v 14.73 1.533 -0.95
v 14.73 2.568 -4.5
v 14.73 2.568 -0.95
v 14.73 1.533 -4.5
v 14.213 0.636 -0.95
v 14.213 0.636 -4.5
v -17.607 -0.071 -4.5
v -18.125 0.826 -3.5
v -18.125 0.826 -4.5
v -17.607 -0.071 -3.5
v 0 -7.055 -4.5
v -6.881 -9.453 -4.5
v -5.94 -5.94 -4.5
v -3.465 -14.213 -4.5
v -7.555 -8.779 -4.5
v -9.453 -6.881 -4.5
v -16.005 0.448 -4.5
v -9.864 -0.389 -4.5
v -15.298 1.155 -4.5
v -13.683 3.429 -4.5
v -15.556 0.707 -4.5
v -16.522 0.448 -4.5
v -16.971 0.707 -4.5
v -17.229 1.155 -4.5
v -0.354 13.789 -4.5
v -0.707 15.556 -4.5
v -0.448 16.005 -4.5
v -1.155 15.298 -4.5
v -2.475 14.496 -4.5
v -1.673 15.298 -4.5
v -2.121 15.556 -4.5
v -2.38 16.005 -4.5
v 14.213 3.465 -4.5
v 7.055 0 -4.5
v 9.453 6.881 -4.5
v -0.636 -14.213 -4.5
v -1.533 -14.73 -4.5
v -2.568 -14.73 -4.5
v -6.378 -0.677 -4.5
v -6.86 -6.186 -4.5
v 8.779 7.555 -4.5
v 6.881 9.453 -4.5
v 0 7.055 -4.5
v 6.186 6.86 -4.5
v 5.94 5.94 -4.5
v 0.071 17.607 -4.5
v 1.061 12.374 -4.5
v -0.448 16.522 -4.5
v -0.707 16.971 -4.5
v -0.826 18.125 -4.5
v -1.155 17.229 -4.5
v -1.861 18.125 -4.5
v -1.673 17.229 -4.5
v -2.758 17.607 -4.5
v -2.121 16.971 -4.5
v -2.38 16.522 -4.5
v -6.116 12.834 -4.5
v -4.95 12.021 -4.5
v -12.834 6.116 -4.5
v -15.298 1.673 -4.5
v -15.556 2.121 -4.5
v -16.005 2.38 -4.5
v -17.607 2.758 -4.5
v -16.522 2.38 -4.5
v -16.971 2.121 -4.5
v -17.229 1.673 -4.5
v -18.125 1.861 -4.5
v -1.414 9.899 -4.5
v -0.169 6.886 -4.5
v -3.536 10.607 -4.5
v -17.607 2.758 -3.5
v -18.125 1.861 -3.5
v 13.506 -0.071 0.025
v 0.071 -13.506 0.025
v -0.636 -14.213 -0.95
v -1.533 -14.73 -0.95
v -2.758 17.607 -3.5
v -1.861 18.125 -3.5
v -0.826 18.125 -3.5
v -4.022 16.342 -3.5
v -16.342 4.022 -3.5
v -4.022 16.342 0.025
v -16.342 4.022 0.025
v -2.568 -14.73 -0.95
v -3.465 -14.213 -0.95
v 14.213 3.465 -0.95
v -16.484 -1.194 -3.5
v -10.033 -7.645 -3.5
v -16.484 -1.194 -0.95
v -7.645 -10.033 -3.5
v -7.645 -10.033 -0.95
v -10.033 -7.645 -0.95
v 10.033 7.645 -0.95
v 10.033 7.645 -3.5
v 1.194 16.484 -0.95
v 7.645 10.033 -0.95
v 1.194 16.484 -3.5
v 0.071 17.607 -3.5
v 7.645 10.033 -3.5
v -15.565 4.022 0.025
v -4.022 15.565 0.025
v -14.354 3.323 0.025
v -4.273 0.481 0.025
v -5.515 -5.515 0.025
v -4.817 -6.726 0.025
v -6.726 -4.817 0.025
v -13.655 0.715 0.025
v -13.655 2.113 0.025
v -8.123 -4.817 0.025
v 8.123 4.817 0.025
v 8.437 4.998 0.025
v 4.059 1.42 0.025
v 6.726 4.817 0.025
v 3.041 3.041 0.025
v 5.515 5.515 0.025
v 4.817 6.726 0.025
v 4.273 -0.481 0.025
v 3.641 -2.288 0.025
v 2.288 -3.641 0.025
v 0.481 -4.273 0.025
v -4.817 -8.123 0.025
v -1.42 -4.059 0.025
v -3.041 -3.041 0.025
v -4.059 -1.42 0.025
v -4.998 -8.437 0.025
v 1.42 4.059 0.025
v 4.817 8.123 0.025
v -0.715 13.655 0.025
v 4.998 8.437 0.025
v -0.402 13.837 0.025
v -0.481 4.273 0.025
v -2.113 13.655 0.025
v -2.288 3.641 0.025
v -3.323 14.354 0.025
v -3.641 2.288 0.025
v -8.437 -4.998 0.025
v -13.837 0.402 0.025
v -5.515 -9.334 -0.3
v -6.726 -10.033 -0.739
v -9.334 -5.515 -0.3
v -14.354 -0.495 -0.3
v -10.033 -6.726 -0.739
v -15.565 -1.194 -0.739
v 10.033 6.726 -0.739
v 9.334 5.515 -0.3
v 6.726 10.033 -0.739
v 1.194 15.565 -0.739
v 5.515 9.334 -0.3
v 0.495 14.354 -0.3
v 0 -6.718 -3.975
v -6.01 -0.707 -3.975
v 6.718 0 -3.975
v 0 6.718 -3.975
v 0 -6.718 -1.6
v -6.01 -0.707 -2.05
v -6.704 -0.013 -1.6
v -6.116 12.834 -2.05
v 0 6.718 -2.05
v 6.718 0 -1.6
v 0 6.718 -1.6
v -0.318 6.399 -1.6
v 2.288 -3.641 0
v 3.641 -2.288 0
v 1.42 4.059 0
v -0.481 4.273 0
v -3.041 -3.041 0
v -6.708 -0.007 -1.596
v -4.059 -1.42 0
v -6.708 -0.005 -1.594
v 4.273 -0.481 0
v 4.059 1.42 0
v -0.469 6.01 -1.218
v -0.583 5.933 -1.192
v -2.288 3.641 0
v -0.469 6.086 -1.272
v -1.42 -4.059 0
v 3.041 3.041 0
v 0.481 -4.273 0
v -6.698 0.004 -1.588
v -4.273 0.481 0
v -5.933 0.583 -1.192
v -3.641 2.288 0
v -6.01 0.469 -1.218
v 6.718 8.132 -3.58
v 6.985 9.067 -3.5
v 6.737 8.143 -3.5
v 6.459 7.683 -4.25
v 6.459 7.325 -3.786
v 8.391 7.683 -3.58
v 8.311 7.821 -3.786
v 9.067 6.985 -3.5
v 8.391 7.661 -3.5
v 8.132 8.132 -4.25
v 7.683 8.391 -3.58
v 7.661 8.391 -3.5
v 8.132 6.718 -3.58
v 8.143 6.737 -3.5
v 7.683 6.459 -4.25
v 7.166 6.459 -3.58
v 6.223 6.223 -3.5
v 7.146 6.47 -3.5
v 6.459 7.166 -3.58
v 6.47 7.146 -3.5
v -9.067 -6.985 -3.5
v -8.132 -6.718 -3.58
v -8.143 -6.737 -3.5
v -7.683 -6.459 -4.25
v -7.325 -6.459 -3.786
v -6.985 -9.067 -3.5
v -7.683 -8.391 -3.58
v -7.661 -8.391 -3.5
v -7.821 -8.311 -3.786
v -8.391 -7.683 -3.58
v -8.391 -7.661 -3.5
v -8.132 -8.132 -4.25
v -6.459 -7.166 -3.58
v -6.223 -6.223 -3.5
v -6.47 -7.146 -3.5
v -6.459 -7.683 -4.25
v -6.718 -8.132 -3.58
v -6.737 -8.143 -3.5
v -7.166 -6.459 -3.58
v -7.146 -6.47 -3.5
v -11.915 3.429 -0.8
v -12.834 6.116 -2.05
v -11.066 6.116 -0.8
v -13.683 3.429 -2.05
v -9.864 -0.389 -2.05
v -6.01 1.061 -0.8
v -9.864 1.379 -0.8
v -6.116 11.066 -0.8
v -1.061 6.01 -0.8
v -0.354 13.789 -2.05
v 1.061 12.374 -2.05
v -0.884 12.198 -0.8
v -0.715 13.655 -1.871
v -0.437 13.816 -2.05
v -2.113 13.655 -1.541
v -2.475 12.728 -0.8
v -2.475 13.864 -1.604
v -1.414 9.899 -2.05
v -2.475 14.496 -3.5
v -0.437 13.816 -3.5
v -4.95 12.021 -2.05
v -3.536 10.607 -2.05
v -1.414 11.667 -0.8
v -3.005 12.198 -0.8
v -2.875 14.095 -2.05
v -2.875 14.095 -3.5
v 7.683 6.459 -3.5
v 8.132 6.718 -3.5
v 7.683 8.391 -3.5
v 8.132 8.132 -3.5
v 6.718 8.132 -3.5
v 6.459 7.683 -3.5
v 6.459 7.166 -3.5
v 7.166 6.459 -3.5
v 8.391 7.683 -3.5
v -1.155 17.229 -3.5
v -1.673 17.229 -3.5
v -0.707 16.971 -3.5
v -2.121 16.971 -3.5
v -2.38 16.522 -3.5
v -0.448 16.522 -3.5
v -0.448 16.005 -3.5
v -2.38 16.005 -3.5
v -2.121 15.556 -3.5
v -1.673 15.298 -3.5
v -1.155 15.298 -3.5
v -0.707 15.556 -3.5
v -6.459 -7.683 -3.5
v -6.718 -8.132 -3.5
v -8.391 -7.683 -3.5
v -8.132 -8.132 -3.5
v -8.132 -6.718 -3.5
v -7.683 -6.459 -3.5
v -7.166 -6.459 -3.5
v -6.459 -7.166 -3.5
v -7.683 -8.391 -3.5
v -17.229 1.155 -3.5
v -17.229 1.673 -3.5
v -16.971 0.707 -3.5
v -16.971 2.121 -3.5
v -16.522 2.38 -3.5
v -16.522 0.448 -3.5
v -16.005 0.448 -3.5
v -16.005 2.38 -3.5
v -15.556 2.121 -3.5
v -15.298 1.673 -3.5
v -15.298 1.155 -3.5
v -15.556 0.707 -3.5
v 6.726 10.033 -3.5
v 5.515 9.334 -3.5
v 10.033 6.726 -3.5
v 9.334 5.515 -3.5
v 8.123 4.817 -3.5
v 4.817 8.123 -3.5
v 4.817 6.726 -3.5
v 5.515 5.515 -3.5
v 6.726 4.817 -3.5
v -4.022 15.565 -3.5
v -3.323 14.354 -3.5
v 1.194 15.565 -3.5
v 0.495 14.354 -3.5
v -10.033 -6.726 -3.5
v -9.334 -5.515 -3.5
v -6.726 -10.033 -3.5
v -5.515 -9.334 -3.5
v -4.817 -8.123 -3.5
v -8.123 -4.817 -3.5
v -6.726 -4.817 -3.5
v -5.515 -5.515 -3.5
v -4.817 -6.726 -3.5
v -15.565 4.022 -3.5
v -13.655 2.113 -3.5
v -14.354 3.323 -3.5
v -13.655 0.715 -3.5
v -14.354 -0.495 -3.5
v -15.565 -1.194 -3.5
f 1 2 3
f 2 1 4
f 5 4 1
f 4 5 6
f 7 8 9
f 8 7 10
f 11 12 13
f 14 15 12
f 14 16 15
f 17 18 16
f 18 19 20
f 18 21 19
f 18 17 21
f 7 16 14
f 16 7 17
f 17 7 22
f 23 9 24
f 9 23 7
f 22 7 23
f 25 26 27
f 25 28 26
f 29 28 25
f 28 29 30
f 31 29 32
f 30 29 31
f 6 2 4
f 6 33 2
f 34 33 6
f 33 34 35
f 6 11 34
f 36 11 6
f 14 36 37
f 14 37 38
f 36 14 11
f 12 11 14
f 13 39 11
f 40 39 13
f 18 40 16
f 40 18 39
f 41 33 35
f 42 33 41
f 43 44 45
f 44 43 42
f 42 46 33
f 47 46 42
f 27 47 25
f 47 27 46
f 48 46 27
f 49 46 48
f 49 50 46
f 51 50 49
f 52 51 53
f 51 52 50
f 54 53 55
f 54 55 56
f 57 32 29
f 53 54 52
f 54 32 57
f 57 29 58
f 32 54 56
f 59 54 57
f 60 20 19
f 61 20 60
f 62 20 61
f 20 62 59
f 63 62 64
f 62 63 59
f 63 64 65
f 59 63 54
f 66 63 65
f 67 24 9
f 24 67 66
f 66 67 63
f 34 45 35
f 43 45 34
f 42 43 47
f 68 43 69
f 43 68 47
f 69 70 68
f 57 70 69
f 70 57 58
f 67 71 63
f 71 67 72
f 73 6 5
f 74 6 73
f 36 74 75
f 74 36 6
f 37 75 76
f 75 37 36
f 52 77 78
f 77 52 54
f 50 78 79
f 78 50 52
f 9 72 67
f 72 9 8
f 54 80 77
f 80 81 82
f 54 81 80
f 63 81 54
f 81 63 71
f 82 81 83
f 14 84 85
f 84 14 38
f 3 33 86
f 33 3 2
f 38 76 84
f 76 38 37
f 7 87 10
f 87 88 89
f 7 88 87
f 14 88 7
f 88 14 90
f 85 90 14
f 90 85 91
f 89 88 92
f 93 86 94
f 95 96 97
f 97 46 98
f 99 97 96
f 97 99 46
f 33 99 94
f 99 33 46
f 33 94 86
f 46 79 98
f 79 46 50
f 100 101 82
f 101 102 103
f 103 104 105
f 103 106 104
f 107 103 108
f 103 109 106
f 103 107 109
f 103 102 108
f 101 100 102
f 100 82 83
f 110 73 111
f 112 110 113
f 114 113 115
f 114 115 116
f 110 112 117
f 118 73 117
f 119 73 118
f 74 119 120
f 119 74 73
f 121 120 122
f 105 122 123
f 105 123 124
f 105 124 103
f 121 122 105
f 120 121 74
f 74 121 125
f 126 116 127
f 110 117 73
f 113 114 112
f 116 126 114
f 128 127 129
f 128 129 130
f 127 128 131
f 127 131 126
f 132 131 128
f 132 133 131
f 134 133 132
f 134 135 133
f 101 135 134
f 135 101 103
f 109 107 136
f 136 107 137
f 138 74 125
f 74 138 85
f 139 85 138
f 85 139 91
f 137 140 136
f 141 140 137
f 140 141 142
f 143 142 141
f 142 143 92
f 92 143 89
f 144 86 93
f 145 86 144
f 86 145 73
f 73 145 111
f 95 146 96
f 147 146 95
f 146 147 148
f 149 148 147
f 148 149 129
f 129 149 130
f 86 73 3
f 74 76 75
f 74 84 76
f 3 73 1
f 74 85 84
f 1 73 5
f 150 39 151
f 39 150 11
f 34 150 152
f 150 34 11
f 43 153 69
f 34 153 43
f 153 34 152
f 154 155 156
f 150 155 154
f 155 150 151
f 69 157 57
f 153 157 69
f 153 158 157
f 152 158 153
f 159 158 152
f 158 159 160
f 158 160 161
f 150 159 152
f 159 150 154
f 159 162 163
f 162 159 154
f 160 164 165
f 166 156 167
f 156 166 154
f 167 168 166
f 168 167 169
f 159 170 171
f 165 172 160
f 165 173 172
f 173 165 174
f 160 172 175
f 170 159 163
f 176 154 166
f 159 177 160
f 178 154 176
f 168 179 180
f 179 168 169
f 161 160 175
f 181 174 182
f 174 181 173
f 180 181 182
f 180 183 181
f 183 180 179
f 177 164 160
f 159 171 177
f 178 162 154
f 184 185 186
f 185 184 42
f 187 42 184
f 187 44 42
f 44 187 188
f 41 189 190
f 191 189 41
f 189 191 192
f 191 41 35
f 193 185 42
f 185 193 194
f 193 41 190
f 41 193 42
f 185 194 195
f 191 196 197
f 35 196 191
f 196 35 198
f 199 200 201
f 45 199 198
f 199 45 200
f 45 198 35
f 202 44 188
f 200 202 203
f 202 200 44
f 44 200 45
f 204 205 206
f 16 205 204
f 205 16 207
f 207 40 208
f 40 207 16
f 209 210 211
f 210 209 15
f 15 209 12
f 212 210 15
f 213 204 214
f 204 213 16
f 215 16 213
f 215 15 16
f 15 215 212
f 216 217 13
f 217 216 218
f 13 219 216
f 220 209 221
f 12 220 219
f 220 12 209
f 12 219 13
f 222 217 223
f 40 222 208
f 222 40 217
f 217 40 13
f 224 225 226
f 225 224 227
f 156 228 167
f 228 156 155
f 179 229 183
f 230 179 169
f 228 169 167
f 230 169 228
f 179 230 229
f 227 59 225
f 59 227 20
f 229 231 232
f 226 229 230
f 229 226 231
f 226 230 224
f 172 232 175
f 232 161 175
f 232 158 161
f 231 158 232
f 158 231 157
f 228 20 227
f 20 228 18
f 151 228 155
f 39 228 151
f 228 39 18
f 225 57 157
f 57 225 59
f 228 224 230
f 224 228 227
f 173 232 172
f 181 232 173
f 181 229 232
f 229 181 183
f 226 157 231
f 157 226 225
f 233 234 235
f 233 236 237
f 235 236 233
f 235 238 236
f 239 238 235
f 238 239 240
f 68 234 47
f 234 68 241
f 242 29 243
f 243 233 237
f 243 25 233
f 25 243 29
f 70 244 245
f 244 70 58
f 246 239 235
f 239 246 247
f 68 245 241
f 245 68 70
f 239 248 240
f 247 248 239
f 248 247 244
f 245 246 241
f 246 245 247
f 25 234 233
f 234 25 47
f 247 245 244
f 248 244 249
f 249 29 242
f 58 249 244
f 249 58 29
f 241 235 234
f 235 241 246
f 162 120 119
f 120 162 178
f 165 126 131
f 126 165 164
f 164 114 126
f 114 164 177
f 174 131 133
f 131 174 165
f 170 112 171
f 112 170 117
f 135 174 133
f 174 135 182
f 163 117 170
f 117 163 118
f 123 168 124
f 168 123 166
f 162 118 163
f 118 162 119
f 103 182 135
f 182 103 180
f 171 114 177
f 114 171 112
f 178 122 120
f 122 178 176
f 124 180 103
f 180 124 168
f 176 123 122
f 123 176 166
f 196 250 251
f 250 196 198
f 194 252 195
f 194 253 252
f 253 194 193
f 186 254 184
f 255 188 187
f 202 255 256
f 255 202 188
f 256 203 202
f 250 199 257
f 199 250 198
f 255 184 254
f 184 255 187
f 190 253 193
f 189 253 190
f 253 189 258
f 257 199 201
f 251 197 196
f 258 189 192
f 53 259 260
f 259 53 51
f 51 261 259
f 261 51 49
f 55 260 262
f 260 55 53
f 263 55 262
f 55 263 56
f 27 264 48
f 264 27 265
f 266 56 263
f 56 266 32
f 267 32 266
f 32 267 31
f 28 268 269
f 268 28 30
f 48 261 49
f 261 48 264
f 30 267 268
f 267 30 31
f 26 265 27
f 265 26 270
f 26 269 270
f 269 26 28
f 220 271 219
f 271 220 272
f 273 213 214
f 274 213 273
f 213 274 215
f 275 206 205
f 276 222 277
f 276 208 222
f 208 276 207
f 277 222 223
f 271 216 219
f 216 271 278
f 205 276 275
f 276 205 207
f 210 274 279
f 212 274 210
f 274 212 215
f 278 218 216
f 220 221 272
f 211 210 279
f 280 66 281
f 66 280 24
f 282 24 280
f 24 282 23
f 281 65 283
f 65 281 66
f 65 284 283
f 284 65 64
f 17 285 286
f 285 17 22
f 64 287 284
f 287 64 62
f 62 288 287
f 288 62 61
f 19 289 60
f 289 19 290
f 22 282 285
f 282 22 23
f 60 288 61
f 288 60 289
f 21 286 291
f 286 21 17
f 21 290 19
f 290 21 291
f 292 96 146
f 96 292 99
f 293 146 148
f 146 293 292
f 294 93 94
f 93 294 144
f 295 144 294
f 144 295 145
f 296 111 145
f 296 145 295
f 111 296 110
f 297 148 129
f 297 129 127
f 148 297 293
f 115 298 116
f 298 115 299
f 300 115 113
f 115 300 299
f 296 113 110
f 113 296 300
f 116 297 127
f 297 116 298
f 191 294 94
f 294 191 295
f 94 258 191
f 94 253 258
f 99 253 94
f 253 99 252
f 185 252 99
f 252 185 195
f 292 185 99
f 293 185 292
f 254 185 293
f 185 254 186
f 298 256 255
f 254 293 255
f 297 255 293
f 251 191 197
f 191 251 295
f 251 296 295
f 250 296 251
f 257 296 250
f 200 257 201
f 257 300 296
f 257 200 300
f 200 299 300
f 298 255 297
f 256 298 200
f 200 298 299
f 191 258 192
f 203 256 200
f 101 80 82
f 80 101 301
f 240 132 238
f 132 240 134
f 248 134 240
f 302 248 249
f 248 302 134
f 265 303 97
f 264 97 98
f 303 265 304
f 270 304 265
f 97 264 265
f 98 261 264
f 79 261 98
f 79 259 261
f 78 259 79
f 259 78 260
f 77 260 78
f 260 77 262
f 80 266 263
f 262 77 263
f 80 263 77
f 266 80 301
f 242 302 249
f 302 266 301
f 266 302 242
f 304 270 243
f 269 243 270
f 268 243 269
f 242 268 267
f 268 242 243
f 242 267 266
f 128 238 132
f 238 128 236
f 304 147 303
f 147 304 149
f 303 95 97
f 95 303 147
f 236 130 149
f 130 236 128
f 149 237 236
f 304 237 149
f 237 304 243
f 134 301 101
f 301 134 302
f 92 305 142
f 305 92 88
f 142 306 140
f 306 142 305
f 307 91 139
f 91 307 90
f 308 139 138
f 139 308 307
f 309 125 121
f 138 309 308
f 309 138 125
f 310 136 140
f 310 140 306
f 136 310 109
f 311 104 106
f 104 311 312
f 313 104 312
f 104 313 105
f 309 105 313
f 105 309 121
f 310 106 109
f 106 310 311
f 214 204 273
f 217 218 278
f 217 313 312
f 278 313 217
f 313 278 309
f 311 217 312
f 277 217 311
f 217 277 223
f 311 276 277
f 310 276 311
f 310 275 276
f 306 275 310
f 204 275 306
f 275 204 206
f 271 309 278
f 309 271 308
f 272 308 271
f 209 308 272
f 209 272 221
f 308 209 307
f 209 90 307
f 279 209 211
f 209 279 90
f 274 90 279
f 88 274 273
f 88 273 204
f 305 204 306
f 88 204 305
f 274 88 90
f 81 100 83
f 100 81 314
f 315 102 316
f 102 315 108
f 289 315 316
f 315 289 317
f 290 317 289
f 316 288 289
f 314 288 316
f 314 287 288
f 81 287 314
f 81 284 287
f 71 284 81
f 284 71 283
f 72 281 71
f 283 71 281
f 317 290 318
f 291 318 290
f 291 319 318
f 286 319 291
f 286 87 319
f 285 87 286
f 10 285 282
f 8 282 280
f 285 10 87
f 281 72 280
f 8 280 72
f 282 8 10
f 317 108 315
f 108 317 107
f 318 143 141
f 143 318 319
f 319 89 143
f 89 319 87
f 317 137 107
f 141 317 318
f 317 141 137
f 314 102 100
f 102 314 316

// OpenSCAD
/******************************************************************
*                                                                 *
* OpenFlexure Microscope: Raspberry Pi Camera v2 push-fit mount   *
*                                                                 *
* This is part of the OpenFlexure microscope, an open-source      *
* microscope and 3-axis translation stage.  It gets really good   *
* precision over a ~10mm range, by using plastic flexure          *
* mechanisms.                                                     *
*                                                                 *
* This file provides two parts for the microscope; the bit that   *
* fits onto the camera (picam2_camera_mount) and a cover that     *
* protects the PCB (picam_cover).  The former is part of the      *
* optics module in optics.scad, and the latter is printed         *
* directly.                                                       *
*                                                                 *
* The fit is set by one main function, picam2_push_fit().  It's   *
* designed to be subtracted from a solid block, with the bottom   *
* of the block at z=0.  It grips the plastic camera housing with  *
* four slightly flexible fingers, which ensures the camera pops   *
* in easily but is held relatively firmly.  Two screw holes are   *
* also provided that should self-tap with M2 or similar screws.   *
* I recommend you use these for extra security if the camera is   *
* likely to be handled a lot.                                     *
*                                                                 *
* (c) Richard Bowman, January 2016                                *
* Released under the CERN Open Hardware License                   *
*                                                                 *
******************************************************************/


use <../utilities.scad>


function picamera_2_camera_mount_height() = 4.5;
bottom = picamera_2_camera_mount_height() * -1;

function picamera_2_camera_sensor_height() = 2; //Height of the sensor above the PCB

module picam2_flex_and_components(cw=8.5+1){
    // A 2D perimeter inside which the flex and components of the camera sit.
    // NB this should fit both v1 and v2 of the module
    // cw is the width of the camera module's casing, nominally 8 or 8.5mm but
    // deliberately printed a bit generous to ensure it fits easily without
    // damaging the flex.

    translate([-cw/2,cw/2-1]) square([cw,13.4-cw/2+1]); //flex (also clears v1 connector)
    translate([-cw/2-2.5,6.7]) square([cw+2.5, 5.4]); //connector
}

module picam1_led(){
    // v1 of the camera module has an LED on board that we should make a cut-out for
    translate([5,10]) square([3.5,2]);
    translate([6,8]) square([3.5,2]);
}

module picam2_cutout( beam_length=15){
    // This module is designed to be subtracted from the bottom of a shape.
    // The z=0 plane should be the print bed.
    // It includes cut-outs for the components on the PCB and also a push-fit hole
    // for the camera module.  This uses flexible "fingers" to grip the camera firmly
    // but gently.  Just push to insert, and wiggle to remove.  You may find popping
    // off the brown ribbon cable and removing the PCB first helps when extracting
    // the camera module again.
    cw = 8.5 + 1.0; //size of camera box sides (NB deliberately loose fitting)
    ch=2.9; //height of camera box (including foam support)
    camera = [cw,cw,ch]; //size of camera box
    hole_r = 4.3; //size of camera aperture
	union(){
        sequential_hull(){
            //cut-out for camera
            translate([0,0,-tiny()]) cube([cw+0.5,cw+0.5,tiny()],center=true); //wider at bottom
            translate([0,0,0.5]) cube([cw,cw,tiny()],center=true);
            translate([0,0,ch/2]) cube([cw,cw,ch],center=true);
            cylinder(r=hole_r, h=2*picamera_2_camera_mount_height(), center=true);
        }

        //clearance for the ribbon cable at top of camera
        fh=2.5; // the height of the flex
        mh = picamera_2_camera_mount_height();

        dz = mh-fh-0.75; // extra height above the flex for the sloping "roof"
        rw = cw - 2*dz;
        hull(){
            translate([0,0,-tiny()]) linear_extrude(fh) picam2_flex_and_components(cw);
            translate([0,0,-tiny()]) linear_extrude(fh+dz) offset(-dz) picam2_flex_and_components(cw);
        }
        //clearance for the LED/resistor on v1 of the camera
        hull(){
            translate([0,0,-tiny()]) linear_extrude(fh) picam1_led();
            translate([0,0,-tiny()]) linear_extrude(fh+dz) offset(-dz) picam1_led();
        }

        //beam clearance
        cylinder(r=hole_r, h=beam_length);

        //chamfered screw holes for mounting
        sx = 21/2; //position of screw holes
        reflect([1,0,0]) translate([sx,0,0]) rotate(60){
            //cylinder(r1=3, r2=0,h=4, center=true); //chamfered bottom
            //deformable_hole_trylinder(1.5/2,2.1/2,h=12, center=true);
            cylinder(r1=3.1, r2=1.1, h=5, $fn=3, center=true);
            cylinder(r=1.1, h=20, $fn=3, center=true);
        }
	}
}
//picam2_cutout();

module picam2_board(h=tiny()){
    // a rounded rectangle with the dimensions of the picamera board v2
    // centred on the origin
    b = 24;
    w = 25;
    roc = 2;
    linear_extrude(h) hull(){
        reflect([1,0]) reflect([0,1]) translate([w/2-roc, b/2-roc]) circle(r=roc,$fn=12);
    }
}

module picamera_2_camera_mount(counterbore=false){
    // A mount for the pi camera v2
    // This should finish at z=0+tiny(), with a surface that can be
    // hull-ed onto the lens assembly.
    b = 24;
    w = 25;
    difference(){
        rotate(45) translate([0,2.4,0]) sequential_hull(){
            translate([0,0,bottom]) picam2_board(h=tiny());
            translate([0,0,-1]) picam2_board(h=tiny());
            translate([0,0,0]) cube([w-(-1.5-bottom)*2,b,tiny()],center=true);
        }
        rotate(45) translate([0,0,bottom]) picam2_cutout();
        if(counterbore){
            translate([0,0,bottom-1]) picamera_2_bottom_mounting_posts(height=999, radius=1, cutouts=false);
            translate([0,0,bottom+1])  picamera_2_bottom_mounting_posts(height=999, radius=2.7, cutouts=false);
        }
    }
}
difference(){
    picamera_2_camera_mount(counterbore=true);
    //rotate([90,0,0]) cylinder(r=999,h=999,$fn=4);
}

module picamera_2_bottom_mounting_posts(height=-1, radius=-1, outers=true, cutouts=true){
    // posts to mount to pi camera from below
    r = radius > 0 ? radius : 2;
    h = height > 0 ? height : 4;
    union(){
        rotate(45){
            reflect([1,0,0]){
                for(y=[0,12.5]) translate([21/2, y, 0]){
                    difference(){
                        if(outers) cylinder(r=r, h=h, $fn=12);
                        if(cutouts) intersection(){
                            cylinder(h=13, d=2*1.7, center=true, $fn=3);
                            rotate(60) cylinder(h=999, d=2*1.7*1.4, center=true, $fn=3);
                        }
                    }
                }
            }
        }
    }
}

/////////// Cover for camera board //////////////
module picamera_2_cover(){
    // A cover for the camera PCB, slips over the bottom of the camera
    // mount.  This version should be compatible with v1 and v2 of the board
    b = 24;
    w = 25;
    h = 3;
    t = 1; //wall thickness
    centre_y=2.4;
    difference(){
        union(){
            //bottom and sides
            difference(){
                translate([-w/2,-b/2+centre_y,0]) cube([w, b, h]);
                // cut out centre to form walls on 3 sides
                translate([-w/2+t,-b/2+centre_y-t,0.75]) cube([w-2*t, b, h]);
                //chamfer the connector edge for ease of access
                translate([-999/2,-b/2+centre_y,h]) rotate([-135,0,0]) cube([999,999,999]);
            }
            //mounting screws
            reflect([1,0,0]) translate([21/2, 0, 0]) cylinder(r=3, h=h, $fn=16);
        }
        //counterbore the mounting screws
        reflect([1,0,0]) translate([21/2, 0, h-1]) rotate(90) intersection(){
           cylinder(r=2, h=999, $fn=16, center=true);
            hole_from_bottom(r=1.1, h=999, base_w=999);
        }
    }
}
//picam_cover();

pcb = [25.4+0.5,24+0.5,2]; //size of the picam PCB (+0.5mm so it fits)
camera_housing = [9,9,2.5]; //size of the plastic housing
camera_housing_y = 2.5; //shift of the camera housing from the centre
lens_unscrew_r = 5.5/2; //size of the bit we unscrew

module generous_camera_bits(){
    //The other stuff on the PCB (mostly the ribbon cable)
    camera = [8.5,8.5,2.3]; //size of camera box
	cw = camera.x+1; //side length of camera box at bottom (slightly larger)
	union(){
		//ribbon cable at top of camera
        sequential_hull(){
            translate([0,0,0]) cube([cw-1,tiny(),4],center=true);
            translate([0,9.4-(4.4/1)/2,0]) cube([cw-1,1,4],center=true);
        }
        //flex connector
        translate([-1.25,9.4,0]) cube([cw-1+2.5, 4.4+1, 4],center=true);

	}
}

module picamera_2_gripper(){
    // this little bit of plastic grips the plastic camera housing
    // and allows you to safely unscrew the lens
    // it protects the (surprisingly delicate) flex that connects the camera to the PCB.
    outer = pcb+[4,-5,camera_housing.z]; //size of the tool
    difference(){
        translate([0,-1,outer.z/2]) cube(outer, center=true);

        //central hole for the camera housing
        translate([0,camera_housing_y,0]) cube(camera_housing + [0,0,999],center=true);

        //cut-outs for the other bits (cable etc.)
        translate([0,camera_housing_y,camera_housing.z]) rotate([180,0,0]) generous_camera_bits();

        //indent for PCB
        translate([0,0,outer.z]) cube(pcb + [0,0,pcb.z],center=true);

    }
}

module picamera_2_lens_gripper(){
    //a tool to unscrew the lens from the pi camera
    inner_r = 4.7/2;
    union(){
        difference(){
            cylinder(r=7,h=2);
            cylinder(r=5,h=999,center=true);
        }
        for(a=[0,90,180,270]) rotate(a) translate([inner_r,0,0]) cube([1.5,5,2]);
    }
}
